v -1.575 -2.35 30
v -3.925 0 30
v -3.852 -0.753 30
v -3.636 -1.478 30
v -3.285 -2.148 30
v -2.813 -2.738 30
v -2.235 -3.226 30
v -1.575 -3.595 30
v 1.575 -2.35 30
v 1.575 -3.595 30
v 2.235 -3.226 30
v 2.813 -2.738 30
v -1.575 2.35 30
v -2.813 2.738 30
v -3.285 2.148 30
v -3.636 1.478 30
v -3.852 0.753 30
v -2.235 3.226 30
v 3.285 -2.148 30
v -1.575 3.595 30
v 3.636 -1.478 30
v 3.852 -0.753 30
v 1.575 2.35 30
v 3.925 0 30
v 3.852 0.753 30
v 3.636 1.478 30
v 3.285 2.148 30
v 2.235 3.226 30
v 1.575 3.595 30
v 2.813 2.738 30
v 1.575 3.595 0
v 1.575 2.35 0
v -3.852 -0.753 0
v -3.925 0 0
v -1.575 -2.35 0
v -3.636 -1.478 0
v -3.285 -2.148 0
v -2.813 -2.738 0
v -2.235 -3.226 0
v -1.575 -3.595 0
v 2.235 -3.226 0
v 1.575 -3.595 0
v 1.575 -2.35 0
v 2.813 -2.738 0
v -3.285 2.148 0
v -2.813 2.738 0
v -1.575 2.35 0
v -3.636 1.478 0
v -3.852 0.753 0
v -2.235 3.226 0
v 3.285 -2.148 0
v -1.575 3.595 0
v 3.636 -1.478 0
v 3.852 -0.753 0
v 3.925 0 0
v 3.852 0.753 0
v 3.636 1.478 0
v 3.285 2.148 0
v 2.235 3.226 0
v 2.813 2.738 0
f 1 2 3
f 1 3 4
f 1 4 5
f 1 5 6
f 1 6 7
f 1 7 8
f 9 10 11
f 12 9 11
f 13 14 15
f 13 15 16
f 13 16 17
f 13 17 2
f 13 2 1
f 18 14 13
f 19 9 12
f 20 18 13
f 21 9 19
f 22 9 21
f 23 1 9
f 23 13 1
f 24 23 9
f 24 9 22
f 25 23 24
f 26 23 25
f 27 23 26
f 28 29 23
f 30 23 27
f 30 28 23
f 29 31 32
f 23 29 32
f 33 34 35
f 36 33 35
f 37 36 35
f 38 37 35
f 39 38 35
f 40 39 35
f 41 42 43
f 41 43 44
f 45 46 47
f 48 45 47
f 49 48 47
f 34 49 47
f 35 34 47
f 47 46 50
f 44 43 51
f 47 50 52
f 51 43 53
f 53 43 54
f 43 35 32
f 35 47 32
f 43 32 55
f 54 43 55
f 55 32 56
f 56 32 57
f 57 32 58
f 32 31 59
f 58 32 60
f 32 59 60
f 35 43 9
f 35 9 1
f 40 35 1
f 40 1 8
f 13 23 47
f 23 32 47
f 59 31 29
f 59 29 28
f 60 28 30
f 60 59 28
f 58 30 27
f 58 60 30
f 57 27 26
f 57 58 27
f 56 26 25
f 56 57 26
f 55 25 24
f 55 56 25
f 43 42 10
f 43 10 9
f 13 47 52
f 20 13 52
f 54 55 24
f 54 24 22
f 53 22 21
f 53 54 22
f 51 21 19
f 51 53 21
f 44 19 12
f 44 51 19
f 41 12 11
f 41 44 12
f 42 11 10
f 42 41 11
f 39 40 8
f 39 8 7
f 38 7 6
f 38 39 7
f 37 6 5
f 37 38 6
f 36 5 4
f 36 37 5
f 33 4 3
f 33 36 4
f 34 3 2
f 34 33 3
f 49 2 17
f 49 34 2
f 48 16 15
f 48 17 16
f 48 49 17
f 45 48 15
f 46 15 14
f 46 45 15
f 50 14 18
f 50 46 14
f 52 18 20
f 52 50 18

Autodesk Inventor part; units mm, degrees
ref_plane "YZ Plane" through (0, 0, 0) normal (1, 0, 0) x (0, 1, 0)
ref_plane "XZ Plane" through (0, 0, 0) normal (0, 1, 0) x (-1, 0, 0)
ref_plane "XY Plane" through (0, 0, 0) normal (0, 0, 1) x (1, 0, 0)
sketch "Sketch1" plane through (0, 0, 0) normal (0, 0, 1) x (1, 0, 0)
  circle A0 centre (0, 0) radius 3.925
  line L0 (-1.575, 5.5) -> (1.575, 5.5)
  line L1 (1.575, 5.5) -> (1.575, 2.35)
  line L2 (1.575, 2.35) -> (-1.575, 2.35)
  line L3 (-1.575, 2.35) -> (-1.575, 5.5)
  line L4 (-1.575, 5.5) -> (1.575, 2.35) construction
  line L5 (1.575, 5.5) -> (-1.575, 2.35) construction
  line L6 (-1.575, -5.5) -> (1.575, -5.5)
  line L7 (1.575, -5.5) -> (1.575, -2.35)
  line L8 (1.575, -2.35) -> (-1.575, -2.35)
  line L9 (-1.575, -2.35) -> (-1.575, -5.5)
  line L10 (-1.575, -5.5) -> (1.575, -2.35) construction
  line L11 (1.575, -5.5) -> (-1.575, -2.35) construction
  point P0 (0, 3.925)
  point P1 (0, -3.925)
  point P2 (-1.575, 3.5951)
  point P3 (-1.575, -3.5951)
  point P4 (1.575, -3.5951)
  point P5 (1.575, 3.5951)
  dimension "d0" = 7.85
  dimension "d1" = 3.15
  dimension "d2" = 3.15
  dimension "d3" = 3.15
  dimension "d4" = 3.15
extrude "Extrusion1" add sketch "Sketch1" along normal blind 30 contours A0 L7 L8 L9 L3 L2 L1
properties part number "long_axel"
